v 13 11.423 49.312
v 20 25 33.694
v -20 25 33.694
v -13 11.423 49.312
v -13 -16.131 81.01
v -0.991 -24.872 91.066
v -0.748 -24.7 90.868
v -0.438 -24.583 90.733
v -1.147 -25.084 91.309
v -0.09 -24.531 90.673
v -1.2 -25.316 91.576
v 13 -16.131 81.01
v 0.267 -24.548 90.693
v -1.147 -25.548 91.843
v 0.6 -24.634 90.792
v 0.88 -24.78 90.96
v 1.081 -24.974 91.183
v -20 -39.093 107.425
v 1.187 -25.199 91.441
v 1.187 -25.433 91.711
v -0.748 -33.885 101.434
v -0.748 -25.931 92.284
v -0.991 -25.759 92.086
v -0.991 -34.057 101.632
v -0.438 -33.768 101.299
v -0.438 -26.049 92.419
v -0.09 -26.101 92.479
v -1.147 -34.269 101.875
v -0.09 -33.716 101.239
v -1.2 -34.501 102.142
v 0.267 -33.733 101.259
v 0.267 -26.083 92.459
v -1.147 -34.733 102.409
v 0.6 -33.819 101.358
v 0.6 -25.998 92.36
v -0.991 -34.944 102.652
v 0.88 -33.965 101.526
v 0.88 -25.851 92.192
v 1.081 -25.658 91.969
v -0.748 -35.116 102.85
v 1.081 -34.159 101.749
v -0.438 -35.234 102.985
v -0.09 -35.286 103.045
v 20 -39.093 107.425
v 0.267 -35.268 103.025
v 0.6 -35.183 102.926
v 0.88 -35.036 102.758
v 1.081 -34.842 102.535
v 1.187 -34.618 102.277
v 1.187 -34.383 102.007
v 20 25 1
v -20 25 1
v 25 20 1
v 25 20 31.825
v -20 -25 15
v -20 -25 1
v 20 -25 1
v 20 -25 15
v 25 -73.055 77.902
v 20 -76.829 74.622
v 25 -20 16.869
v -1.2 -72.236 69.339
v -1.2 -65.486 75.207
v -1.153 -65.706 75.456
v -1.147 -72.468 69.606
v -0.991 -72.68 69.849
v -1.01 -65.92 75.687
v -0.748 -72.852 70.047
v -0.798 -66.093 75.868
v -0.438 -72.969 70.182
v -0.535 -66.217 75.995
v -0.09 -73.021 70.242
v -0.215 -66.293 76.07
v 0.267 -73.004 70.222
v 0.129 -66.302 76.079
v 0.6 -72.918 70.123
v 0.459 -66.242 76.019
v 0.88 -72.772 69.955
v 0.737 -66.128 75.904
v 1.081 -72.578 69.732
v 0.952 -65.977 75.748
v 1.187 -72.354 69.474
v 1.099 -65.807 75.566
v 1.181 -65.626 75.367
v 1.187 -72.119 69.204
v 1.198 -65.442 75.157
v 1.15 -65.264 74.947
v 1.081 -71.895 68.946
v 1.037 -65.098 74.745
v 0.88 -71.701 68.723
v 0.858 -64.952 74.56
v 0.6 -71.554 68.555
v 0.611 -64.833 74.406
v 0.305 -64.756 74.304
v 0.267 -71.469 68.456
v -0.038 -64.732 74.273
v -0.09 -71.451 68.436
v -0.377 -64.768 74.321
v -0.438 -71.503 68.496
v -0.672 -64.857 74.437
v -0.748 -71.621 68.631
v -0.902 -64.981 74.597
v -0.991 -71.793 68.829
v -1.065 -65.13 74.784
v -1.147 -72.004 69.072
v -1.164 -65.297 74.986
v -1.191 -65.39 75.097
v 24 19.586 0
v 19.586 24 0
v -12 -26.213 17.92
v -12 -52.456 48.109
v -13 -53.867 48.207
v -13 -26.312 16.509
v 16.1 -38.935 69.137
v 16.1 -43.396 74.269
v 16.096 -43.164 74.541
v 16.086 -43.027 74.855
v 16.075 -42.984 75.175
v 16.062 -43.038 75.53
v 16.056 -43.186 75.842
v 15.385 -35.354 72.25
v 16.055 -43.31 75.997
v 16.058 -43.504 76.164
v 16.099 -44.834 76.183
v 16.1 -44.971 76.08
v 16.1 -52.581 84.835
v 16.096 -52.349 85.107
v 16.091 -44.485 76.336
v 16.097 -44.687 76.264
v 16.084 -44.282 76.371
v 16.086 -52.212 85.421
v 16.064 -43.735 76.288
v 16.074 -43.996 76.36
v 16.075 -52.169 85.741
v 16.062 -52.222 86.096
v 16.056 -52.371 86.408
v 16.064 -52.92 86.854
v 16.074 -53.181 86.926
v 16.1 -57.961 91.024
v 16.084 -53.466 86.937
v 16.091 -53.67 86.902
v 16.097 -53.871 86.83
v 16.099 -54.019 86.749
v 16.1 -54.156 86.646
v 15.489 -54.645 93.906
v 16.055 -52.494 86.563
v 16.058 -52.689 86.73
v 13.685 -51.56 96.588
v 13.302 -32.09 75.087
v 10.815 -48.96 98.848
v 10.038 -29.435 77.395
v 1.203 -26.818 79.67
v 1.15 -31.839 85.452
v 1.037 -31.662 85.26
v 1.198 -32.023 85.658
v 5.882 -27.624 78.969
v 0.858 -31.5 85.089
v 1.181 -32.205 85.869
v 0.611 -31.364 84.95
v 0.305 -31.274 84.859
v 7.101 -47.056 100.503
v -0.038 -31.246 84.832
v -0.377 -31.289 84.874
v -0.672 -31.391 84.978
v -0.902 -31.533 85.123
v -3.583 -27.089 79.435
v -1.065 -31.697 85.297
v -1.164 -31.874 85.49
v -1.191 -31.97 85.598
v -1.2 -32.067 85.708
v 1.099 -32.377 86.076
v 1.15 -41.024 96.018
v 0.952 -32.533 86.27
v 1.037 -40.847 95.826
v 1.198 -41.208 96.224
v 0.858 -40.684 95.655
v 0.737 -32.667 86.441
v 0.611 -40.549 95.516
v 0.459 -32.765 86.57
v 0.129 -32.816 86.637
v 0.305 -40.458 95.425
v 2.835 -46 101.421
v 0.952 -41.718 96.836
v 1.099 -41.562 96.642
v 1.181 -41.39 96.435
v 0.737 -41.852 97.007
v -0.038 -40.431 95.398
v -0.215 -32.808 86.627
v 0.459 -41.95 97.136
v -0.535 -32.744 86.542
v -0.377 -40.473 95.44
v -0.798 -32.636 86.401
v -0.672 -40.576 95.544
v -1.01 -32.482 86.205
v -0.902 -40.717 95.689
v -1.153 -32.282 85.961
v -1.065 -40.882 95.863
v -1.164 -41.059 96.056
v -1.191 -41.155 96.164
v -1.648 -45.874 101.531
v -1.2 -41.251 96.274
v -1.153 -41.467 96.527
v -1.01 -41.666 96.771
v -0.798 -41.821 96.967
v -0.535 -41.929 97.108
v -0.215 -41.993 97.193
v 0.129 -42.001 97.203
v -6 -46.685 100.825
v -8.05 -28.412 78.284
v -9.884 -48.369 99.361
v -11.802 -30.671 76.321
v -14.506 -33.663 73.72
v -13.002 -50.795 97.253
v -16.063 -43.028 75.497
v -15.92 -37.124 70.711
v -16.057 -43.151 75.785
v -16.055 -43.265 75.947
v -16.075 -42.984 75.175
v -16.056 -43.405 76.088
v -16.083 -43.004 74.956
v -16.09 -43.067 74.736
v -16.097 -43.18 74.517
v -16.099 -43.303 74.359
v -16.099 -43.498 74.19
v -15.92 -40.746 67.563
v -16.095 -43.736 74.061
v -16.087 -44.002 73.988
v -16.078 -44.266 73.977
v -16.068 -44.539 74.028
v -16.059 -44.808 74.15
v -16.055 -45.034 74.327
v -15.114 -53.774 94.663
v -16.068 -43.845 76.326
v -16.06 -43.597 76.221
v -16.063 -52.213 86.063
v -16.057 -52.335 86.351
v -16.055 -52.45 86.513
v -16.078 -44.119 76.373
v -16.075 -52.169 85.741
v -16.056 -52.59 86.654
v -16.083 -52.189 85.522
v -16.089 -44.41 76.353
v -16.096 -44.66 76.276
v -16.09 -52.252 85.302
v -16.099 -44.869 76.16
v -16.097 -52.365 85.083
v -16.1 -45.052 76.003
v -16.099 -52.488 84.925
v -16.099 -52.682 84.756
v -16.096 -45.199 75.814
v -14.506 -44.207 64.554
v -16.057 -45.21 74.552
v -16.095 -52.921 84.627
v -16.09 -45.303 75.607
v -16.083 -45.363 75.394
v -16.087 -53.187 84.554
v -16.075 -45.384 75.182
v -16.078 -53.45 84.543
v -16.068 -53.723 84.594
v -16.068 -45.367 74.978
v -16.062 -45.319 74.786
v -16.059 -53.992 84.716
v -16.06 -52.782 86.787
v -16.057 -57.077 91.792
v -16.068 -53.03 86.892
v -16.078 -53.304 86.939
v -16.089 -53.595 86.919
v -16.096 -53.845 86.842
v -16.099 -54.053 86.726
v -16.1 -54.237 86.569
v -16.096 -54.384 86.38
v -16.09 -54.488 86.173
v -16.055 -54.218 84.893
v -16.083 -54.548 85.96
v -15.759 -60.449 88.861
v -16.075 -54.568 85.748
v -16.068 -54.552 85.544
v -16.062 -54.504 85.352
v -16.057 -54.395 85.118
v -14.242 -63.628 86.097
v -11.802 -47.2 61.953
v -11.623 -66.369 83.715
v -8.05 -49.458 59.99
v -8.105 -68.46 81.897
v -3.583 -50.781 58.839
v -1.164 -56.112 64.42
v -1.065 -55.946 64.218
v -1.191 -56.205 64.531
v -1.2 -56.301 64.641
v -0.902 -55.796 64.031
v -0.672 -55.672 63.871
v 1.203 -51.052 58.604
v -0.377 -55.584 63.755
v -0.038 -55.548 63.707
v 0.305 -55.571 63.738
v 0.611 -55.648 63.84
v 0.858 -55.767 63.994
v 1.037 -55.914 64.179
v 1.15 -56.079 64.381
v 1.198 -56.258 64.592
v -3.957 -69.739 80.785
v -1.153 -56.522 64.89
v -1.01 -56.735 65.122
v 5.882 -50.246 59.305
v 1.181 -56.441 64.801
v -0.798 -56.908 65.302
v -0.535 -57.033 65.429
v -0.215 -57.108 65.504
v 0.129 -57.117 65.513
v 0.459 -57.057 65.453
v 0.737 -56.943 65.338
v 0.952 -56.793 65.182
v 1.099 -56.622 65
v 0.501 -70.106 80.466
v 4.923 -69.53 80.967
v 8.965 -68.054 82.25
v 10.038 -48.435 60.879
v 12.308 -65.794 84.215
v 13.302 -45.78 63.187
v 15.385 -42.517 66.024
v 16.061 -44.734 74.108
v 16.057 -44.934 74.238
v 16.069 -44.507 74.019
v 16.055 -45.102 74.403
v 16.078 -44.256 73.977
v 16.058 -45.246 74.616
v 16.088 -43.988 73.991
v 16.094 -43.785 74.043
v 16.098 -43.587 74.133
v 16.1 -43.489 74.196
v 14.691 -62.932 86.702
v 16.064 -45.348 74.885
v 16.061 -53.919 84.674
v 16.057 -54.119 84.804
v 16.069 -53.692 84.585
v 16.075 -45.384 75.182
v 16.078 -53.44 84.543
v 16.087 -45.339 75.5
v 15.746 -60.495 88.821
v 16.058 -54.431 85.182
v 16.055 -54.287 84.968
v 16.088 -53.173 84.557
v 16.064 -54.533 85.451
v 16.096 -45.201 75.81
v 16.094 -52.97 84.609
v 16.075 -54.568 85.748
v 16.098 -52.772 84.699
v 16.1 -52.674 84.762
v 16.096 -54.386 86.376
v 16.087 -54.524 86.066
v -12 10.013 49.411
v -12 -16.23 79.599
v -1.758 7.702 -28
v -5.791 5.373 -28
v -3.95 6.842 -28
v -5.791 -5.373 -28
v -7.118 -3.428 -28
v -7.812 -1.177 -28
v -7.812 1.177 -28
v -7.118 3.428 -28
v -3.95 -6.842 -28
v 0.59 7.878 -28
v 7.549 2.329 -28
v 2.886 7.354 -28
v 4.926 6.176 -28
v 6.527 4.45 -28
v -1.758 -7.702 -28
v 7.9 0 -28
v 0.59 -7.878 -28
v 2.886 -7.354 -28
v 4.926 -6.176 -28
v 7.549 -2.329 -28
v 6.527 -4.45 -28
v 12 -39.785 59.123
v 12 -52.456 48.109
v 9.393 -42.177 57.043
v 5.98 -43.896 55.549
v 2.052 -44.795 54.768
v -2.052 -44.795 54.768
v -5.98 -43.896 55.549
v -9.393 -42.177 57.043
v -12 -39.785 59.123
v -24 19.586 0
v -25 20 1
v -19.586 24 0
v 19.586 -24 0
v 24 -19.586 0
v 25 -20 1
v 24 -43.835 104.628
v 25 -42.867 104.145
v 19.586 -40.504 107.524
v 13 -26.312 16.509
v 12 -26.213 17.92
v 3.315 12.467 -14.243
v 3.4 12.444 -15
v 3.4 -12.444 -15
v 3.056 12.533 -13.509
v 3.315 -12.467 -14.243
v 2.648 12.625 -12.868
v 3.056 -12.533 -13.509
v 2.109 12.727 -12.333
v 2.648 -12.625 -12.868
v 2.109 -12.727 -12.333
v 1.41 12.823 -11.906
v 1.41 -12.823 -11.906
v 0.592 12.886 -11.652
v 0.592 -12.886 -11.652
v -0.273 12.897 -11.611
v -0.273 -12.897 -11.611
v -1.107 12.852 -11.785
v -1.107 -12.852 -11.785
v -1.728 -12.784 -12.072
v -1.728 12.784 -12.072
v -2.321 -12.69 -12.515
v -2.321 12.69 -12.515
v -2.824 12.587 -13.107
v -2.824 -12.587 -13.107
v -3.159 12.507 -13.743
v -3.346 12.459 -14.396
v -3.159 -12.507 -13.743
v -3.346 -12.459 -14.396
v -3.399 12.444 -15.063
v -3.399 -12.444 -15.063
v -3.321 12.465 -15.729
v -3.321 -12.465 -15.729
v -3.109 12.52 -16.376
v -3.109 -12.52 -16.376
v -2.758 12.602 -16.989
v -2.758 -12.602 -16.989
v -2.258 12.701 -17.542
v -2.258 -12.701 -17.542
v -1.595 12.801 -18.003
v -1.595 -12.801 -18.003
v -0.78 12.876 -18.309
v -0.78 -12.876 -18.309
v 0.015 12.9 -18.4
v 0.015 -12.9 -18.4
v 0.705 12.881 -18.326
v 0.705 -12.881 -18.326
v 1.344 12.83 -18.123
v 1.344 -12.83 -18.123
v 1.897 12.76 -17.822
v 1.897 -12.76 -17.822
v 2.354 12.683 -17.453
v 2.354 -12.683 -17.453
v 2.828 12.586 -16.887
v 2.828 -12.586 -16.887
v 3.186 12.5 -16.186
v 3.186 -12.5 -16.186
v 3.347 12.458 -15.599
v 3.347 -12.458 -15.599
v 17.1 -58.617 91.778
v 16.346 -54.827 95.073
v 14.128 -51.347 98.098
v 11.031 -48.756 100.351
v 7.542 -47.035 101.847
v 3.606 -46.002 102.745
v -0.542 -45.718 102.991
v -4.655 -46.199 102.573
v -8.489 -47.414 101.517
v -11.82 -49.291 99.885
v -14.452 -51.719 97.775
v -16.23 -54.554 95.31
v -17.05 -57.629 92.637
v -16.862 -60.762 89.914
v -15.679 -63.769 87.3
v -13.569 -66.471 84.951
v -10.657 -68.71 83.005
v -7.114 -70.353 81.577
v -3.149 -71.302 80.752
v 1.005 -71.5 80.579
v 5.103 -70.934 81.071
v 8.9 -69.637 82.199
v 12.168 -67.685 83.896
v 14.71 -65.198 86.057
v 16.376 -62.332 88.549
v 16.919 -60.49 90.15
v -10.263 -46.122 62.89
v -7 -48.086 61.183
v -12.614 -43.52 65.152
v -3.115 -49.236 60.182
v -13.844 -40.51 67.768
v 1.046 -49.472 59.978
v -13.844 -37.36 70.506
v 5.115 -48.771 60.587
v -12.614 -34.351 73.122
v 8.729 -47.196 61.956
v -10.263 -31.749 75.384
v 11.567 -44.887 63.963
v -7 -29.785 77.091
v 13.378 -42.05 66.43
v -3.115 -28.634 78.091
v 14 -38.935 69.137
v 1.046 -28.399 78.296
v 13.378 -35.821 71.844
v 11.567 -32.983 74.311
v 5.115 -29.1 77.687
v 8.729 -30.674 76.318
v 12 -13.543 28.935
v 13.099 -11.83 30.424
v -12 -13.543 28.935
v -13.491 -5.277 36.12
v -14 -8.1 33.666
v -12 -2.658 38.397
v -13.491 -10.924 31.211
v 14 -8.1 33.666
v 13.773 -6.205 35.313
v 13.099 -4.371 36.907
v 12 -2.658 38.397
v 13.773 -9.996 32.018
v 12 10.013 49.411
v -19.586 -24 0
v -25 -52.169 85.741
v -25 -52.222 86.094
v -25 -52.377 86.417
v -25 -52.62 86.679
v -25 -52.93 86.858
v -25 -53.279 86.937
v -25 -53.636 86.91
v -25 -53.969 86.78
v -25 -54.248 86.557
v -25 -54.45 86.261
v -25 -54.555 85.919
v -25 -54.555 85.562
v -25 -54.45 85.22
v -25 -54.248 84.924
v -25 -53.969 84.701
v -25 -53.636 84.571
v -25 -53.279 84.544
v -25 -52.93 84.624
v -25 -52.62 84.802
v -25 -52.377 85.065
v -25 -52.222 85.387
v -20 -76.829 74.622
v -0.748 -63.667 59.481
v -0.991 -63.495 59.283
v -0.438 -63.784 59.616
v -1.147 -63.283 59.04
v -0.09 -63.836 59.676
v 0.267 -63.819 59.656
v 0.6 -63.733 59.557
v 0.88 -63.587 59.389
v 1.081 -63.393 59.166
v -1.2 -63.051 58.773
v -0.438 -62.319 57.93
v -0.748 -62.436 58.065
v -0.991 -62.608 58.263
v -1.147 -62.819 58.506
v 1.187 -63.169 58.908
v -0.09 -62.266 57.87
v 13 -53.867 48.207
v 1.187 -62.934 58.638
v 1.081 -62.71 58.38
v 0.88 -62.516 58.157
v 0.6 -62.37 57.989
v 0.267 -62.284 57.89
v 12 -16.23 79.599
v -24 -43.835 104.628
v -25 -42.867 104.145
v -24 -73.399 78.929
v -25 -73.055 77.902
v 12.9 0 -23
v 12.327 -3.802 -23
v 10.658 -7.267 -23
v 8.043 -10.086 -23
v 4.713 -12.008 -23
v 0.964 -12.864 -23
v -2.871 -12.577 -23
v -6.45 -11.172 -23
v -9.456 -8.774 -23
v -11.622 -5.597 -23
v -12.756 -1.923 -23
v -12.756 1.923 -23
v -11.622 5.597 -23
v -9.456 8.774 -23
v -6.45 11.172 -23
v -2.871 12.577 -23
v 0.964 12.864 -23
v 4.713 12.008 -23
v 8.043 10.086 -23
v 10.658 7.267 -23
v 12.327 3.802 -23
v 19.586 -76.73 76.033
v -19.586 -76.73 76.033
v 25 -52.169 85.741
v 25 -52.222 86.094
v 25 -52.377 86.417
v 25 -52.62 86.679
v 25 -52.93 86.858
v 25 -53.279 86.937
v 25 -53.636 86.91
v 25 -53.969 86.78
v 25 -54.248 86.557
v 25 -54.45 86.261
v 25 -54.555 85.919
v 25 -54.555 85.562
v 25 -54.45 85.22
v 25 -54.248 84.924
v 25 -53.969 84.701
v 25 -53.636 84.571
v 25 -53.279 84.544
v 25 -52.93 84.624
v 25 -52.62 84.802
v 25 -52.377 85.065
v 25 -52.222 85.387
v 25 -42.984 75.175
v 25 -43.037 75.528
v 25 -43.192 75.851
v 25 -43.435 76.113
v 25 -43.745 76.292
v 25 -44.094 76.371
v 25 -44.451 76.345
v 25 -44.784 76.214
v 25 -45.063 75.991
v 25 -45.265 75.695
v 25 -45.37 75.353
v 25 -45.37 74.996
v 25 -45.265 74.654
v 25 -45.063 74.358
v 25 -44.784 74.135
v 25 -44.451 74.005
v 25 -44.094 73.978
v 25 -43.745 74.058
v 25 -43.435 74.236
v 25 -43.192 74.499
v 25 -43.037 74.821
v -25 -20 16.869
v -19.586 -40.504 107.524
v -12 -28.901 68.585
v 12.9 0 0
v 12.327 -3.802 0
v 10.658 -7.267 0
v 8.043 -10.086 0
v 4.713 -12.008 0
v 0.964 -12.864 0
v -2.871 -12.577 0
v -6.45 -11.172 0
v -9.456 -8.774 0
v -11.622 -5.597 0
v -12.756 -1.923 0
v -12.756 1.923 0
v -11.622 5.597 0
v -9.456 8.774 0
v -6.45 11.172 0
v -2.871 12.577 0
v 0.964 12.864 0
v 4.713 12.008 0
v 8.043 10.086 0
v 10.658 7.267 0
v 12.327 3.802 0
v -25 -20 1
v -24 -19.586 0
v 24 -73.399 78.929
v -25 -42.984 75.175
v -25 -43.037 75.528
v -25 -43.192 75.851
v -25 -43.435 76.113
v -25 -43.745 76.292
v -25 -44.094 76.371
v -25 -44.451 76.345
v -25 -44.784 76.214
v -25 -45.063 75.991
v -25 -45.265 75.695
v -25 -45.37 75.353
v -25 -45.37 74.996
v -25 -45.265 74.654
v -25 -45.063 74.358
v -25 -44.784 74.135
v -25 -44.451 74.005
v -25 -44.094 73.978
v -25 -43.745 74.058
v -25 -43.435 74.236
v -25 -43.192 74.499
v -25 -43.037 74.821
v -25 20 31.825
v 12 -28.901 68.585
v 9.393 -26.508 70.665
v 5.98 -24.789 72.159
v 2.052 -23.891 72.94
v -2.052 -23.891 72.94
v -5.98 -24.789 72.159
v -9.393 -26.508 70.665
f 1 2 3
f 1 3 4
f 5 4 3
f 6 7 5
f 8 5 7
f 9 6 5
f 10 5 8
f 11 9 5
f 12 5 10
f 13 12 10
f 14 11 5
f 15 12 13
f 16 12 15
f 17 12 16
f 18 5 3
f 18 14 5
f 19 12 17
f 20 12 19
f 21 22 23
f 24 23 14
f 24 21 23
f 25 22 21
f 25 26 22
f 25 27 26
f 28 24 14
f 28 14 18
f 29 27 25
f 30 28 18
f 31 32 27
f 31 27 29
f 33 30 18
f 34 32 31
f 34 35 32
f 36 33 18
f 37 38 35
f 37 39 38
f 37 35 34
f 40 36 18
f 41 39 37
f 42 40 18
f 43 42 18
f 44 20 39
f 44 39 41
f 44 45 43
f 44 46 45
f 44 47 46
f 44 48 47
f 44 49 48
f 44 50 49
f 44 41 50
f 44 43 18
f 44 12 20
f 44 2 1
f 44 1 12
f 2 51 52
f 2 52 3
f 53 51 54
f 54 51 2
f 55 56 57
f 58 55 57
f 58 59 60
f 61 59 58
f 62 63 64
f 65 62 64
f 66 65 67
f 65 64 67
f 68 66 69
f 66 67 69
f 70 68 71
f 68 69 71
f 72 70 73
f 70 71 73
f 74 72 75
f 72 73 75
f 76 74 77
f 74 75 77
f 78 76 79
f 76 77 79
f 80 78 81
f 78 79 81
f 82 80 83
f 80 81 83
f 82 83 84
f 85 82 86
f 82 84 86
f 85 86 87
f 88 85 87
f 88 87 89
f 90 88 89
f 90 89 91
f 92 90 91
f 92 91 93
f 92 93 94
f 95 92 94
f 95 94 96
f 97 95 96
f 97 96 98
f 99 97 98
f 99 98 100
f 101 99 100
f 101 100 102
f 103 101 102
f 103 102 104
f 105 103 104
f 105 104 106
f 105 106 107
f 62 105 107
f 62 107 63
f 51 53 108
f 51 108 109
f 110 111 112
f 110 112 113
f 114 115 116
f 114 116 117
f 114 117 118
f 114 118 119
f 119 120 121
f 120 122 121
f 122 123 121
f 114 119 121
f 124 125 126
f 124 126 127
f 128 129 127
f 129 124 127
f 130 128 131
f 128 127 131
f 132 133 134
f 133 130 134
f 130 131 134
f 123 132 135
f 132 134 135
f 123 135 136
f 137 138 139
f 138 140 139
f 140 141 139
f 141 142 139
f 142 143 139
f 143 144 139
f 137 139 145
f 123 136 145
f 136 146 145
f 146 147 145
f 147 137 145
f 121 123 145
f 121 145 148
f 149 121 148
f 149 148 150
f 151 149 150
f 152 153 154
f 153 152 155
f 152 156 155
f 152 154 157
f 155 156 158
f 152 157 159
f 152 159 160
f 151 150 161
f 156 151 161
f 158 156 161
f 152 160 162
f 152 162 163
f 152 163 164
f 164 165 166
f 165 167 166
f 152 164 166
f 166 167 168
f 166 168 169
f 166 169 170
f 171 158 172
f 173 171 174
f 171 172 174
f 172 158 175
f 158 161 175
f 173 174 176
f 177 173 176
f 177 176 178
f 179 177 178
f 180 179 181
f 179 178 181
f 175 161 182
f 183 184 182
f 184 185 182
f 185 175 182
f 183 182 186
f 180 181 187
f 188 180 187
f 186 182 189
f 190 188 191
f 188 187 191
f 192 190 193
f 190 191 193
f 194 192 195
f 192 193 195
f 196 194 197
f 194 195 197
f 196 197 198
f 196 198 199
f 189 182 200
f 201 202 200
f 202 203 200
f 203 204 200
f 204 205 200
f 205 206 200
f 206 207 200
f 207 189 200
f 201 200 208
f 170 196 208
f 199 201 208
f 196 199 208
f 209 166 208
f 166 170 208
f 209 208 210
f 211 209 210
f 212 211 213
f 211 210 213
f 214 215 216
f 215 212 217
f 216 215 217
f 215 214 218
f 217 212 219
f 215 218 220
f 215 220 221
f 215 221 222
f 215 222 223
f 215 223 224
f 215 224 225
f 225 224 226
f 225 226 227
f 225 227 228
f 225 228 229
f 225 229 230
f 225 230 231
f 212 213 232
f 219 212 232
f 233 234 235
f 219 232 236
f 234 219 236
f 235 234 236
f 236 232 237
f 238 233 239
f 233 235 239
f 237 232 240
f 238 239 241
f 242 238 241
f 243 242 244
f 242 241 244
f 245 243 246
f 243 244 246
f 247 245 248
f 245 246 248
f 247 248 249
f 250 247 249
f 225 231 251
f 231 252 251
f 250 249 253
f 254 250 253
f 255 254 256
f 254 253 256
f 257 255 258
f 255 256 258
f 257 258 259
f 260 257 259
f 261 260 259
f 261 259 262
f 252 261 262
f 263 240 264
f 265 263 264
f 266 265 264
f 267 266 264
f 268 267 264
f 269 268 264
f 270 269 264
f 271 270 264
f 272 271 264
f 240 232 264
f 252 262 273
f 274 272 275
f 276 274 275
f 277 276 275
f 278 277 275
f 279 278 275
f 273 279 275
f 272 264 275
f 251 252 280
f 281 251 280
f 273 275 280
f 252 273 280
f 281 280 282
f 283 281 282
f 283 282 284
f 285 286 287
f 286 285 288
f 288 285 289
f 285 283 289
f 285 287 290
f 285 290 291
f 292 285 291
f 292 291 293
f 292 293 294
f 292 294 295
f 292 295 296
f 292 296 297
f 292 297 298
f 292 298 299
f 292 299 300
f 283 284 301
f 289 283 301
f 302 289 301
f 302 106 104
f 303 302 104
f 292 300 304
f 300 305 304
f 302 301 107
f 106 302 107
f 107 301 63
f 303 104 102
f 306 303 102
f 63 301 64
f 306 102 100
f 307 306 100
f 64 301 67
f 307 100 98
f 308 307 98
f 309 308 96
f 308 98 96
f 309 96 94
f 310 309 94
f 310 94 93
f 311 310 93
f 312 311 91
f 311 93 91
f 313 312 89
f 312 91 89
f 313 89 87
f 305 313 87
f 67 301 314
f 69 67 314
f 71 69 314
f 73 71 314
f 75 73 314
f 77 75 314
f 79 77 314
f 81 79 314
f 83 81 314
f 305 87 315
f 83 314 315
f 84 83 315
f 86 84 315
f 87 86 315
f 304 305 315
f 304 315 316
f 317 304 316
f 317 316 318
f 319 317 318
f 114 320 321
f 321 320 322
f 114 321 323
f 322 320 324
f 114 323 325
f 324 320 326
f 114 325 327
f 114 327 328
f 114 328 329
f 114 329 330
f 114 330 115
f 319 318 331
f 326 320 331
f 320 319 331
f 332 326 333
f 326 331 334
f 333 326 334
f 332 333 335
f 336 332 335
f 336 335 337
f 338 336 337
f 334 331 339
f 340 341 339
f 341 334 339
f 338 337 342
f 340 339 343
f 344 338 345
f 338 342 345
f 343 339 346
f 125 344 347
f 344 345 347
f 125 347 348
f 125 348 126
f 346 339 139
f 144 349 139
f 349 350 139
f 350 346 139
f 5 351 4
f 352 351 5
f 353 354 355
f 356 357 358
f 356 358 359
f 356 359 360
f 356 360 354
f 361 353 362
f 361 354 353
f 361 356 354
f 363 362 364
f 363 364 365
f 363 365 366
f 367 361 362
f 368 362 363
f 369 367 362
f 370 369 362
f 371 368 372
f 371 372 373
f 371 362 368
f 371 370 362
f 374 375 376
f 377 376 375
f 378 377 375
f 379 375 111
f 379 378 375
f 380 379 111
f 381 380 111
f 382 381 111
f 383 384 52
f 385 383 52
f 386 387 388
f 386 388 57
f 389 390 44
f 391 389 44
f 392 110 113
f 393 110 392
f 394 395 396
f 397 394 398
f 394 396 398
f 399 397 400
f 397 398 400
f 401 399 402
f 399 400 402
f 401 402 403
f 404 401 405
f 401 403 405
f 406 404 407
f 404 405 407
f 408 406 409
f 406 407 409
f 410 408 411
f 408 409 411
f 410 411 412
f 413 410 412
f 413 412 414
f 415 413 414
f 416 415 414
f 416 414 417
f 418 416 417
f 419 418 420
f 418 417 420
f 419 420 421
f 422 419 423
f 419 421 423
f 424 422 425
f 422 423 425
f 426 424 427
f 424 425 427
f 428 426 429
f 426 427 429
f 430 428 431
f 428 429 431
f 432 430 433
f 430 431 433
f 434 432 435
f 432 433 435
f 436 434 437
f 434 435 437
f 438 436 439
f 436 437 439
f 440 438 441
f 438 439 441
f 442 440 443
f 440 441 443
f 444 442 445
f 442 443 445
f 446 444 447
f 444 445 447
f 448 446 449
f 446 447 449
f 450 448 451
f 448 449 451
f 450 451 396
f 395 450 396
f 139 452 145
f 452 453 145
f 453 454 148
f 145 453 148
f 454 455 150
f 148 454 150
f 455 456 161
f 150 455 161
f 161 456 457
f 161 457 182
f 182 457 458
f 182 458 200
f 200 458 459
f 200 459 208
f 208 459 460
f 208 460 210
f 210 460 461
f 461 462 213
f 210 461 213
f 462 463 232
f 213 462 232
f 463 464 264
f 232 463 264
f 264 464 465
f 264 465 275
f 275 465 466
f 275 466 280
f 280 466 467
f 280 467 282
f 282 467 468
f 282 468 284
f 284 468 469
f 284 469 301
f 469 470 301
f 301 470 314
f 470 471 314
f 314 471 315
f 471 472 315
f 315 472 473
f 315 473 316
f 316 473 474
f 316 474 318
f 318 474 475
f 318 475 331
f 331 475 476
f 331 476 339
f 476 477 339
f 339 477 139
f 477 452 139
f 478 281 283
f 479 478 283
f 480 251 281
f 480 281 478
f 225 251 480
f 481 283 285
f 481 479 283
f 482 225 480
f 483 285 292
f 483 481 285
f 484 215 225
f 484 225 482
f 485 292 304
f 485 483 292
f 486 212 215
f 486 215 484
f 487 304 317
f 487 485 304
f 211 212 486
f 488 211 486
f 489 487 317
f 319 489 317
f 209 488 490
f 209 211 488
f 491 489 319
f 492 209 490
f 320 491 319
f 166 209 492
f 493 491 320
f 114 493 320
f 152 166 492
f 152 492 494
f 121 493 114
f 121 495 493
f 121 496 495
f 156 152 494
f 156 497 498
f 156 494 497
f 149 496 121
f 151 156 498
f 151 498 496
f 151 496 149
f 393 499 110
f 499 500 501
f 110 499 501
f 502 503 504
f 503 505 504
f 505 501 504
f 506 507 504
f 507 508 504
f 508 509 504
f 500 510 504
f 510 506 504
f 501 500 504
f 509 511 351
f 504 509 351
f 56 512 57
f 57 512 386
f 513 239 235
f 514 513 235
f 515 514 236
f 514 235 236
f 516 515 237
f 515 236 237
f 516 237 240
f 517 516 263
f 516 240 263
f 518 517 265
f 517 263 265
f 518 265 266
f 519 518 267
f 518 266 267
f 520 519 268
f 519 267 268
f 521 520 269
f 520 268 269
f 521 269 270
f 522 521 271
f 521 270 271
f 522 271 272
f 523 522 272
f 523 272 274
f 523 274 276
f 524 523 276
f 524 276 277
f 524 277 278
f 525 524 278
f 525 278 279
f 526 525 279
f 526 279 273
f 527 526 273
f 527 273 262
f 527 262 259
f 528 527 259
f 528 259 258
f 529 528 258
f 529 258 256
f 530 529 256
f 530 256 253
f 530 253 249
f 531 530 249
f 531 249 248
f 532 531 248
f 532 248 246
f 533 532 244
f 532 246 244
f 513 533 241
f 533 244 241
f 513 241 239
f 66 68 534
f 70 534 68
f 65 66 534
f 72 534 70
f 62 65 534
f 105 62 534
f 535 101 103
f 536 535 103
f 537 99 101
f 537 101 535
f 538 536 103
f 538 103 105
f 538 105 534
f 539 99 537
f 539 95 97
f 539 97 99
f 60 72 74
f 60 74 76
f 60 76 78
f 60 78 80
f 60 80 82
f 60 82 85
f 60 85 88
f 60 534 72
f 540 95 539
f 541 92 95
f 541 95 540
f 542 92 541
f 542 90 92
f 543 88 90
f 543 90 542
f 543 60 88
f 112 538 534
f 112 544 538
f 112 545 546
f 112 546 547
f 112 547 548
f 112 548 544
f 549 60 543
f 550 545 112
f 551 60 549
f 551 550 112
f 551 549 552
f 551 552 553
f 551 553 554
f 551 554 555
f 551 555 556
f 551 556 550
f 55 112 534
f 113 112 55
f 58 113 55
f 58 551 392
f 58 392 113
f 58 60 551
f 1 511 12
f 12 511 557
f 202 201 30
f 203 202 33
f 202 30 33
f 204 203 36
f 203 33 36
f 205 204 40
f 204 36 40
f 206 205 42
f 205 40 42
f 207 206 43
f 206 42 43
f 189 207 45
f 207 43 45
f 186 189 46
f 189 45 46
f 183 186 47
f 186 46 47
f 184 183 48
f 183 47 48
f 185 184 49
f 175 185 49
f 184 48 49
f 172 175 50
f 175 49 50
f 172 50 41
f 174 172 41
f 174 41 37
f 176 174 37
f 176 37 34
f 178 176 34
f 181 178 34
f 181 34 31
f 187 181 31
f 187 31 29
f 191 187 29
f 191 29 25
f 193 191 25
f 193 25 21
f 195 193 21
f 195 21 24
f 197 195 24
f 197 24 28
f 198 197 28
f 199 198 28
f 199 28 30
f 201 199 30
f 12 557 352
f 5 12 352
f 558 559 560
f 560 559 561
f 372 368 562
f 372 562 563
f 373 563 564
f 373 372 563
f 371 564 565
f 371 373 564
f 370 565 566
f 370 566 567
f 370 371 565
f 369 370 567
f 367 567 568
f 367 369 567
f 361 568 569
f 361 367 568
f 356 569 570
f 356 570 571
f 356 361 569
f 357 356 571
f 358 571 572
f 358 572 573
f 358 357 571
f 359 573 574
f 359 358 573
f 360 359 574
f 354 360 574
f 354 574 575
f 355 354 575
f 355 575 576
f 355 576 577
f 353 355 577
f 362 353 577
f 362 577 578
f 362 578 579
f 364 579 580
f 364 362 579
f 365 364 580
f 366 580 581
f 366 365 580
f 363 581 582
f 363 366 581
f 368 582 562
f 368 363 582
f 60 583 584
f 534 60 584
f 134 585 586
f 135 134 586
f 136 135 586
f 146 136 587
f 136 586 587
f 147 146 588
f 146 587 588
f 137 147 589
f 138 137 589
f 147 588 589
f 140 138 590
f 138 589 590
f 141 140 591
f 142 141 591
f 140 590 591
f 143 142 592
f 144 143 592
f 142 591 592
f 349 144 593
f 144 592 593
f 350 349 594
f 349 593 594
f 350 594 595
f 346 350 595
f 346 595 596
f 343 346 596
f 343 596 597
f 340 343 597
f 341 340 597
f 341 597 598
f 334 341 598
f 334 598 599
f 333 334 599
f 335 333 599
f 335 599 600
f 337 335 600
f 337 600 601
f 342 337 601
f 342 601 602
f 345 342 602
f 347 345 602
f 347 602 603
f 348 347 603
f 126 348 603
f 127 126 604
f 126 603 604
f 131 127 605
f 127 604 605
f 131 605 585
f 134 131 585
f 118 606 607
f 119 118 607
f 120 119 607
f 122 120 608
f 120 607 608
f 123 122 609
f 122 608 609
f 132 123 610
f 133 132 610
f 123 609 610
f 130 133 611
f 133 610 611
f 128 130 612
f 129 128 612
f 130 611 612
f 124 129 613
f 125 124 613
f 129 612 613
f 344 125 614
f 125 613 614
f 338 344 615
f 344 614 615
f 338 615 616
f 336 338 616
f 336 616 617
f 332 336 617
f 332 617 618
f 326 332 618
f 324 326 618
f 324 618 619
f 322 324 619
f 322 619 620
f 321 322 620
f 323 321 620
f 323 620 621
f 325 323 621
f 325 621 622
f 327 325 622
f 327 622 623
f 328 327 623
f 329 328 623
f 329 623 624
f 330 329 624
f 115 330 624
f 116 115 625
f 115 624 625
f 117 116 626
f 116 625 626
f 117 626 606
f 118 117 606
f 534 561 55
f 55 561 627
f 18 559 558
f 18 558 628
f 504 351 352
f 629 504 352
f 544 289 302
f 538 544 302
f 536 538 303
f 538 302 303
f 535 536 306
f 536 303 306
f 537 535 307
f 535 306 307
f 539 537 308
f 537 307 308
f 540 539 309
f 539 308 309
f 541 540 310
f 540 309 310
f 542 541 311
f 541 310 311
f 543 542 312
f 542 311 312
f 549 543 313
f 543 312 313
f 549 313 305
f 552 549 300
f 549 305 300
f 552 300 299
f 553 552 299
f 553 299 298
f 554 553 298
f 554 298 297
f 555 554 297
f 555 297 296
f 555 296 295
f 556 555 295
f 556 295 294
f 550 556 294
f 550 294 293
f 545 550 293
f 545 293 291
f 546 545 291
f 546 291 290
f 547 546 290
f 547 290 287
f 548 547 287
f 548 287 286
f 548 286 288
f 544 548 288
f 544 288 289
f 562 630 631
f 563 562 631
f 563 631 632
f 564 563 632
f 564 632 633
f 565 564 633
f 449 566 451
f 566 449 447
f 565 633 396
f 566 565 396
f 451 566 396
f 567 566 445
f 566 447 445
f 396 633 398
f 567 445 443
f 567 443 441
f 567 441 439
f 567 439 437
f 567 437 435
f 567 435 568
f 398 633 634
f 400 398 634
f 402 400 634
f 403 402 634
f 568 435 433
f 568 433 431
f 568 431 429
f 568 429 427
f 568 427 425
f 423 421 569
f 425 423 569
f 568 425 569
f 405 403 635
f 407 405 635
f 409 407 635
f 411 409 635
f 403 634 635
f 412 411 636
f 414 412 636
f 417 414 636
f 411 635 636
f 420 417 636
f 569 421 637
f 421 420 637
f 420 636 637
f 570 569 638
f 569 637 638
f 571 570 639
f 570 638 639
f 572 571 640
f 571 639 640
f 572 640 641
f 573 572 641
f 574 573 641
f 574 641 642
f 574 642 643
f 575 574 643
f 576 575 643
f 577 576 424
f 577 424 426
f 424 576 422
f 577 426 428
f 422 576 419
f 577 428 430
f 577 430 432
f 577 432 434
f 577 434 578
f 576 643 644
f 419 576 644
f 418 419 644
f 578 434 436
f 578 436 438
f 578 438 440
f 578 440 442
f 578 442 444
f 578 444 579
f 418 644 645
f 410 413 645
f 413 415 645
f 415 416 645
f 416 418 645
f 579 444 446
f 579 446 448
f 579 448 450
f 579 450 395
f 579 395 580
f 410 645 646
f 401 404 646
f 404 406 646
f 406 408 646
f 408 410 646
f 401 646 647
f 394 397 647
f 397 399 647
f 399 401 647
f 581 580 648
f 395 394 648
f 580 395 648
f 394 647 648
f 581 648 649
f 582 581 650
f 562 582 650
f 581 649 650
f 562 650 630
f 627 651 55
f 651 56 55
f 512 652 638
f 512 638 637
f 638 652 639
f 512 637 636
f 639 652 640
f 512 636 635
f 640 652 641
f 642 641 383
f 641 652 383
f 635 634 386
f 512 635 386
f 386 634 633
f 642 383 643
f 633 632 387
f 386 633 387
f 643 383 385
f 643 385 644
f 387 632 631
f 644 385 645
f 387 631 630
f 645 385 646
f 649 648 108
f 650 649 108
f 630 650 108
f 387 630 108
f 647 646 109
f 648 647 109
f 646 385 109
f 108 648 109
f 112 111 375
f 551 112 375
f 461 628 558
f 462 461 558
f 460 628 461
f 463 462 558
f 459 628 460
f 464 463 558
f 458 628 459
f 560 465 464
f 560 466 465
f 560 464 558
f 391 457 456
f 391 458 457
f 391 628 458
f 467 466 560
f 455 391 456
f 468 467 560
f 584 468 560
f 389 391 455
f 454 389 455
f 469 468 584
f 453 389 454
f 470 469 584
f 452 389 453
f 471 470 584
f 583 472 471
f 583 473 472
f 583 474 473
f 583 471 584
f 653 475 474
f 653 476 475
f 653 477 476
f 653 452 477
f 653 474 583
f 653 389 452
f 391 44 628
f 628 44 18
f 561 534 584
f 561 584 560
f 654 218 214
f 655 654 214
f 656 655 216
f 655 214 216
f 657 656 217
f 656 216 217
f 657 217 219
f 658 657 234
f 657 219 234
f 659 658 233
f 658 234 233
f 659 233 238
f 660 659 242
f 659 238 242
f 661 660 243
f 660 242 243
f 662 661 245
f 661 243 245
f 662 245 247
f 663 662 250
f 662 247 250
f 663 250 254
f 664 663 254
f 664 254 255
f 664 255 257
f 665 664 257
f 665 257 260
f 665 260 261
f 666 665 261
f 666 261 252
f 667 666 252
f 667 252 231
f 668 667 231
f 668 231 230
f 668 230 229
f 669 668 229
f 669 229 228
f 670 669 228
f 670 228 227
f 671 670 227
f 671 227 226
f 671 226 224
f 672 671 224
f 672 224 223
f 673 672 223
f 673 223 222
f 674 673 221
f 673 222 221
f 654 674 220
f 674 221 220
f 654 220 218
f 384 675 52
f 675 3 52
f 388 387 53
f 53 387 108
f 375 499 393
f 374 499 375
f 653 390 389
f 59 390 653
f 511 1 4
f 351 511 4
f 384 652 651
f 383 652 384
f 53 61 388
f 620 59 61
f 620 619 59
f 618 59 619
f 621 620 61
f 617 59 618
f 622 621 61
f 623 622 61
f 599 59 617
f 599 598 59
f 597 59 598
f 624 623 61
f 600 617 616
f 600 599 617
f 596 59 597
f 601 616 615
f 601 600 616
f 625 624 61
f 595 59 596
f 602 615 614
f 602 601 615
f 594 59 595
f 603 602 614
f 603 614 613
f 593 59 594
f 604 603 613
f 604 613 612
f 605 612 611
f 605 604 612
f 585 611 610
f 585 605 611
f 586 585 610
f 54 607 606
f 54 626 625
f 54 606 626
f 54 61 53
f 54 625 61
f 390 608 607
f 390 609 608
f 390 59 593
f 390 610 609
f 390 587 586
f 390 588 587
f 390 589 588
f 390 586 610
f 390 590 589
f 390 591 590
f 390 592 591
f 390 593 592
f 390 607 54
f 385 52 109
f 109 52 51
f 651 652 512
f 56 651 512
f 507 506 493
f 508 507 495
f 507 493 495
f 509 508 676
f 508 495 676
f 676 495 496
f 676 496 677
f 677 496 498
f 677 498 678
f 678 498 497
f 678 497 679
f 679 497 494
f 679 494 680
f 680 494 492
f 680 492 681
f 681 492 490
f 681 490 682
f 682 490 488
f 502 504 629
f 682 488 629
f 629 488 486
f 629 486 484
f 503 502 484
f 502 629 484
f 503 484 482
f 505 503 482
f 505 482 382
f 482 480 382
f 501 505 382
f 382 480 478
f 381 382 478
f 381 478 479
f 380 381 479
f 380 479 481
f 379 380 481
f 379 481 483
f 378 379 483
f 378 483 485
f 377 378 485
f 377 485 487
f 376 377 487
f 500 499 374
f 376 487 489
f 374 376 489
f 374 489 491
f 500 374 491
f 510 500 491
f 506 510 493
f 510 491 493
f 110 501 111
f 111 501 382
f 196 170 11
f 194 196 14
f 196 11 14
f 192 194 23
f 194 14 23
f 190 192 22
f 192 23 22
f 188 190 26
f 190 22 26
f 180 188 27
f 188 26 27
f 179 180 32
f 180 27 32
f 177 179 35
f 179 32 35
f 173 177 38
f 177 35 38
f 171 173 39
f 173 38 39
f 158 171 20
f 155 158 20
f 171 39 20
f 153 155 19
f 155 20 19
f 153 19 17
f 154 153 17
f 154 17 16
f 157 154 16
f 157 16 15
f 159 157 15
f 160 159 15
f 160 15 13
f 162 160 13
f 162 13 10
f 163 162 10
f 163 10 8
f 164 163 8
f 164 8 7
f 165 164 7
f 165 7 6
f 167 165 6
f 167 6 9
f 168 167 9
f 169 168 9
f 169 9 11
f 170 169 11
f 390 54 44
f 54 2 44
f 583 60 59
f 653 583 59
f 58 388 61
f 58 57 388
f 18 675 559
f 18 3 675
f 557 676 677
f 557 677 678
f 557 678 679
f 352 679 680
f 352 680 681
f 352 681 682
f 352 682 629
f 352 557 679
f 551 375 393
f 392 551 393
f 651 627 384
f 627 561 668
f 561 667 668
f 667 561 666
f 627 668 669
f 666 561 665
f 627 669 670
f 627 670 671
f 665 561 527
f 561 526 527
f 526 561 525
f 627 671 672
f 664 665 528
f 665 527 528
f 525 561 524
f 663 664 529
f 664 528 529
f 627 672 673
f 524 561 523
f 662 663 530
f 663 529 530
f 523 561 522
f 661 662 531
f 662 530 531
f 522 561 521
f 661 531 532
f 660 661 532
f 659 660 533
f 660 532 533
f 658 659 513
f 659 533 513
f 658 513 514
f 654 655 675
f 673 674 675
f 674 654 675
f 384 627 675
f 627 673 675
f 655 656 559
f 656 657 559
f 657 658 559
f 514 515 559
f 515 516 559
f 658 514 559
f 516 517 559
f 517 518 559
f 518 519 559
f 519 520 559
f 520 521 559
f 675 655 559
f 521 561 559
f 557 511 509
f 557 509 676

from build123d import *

# Parameters (mm, degrees)
F0_W      = 50
F0_H      = 50
F1_DEPTH  = 15
F2_R      = 12.9
F3_DEPTH  = 28
F4_R      = 3.4
F5_DEPTH  = 21
F7_DEPTH  = 50
F8_R      = 14
F9_DEPTH  = 77
F10_R     = 16.1
F11_DEPTH = 30
F12_W     = 24
F12_H     = 40
F13_DEPTH = 117.8222610619
F14_R     = 1.2
F15_DEPTH = 117.8222610619
F16_R     = 1.2
F17_DEPTH = 50.001
F18_SIZE  = 5
F19_SIZE  = 1


with BuildPart() as f1:
    # F0 (on Top) → F1 (new body)
    with BuildSketch(Plane.XY):
        Rectangle(F0_W, F0_H)
    extrude(amount=F1_DEPTH)

    # F2 (on face) → F3 (join)
    with BuildSketch(Plane(origin=(0, 0, 0), x_dir=(1, 0, 0), z_dir=(0, 0, -1))):
        Circle(F2_R)
    extrude(amount=F3_DEPTH)

    # F4 (on Front) → F5 (cut, symmetric)
    with BuildSketch(Plane.XZ):
        with Locations((0, -15)):
            Circle(F4_R)
    extrude(amount=F5_DEPTH, both=True, mode=Mode.SUBTRACT)

    # F6 (on face) → F7 (join)
    with BuildSketch(Plane.YZ.offset(25)):
        Polygon((-77.4847223192, 75.3767664178), (-25, 15), (25, 15), (25, 33.6942339742), (-39.7492433081, 108.1797178673), align=None)
    extrude(amount=-F7_DEPTH)

    # F8 (on face) → F9 (cut)
    with BuildSketch(Plane(origin=(0, -70.6720690728, 81.2989155343), x_dir=(1, 0, 0), z_dir=(0, -0.656059029, 0.7547095802))):
        with Locations((0, 15.9731459293)):
            Circle(F8_R)
    extrude(amount=-F9_DEPTH, mode=Mode.SUBTRACT)

    # F10 (on face) → F11 (cut)
    with BuildSketch(Plane(origin=(0, -70.6720690728, 81.2989155343), x_dir=(1, 0, 0), z_dir=(0, -0.656059029, 0.7547095802))):
        with Locations((0, 15.9731459293)):
            Circle(F10_R)
    extrude(amount=-F11_DEPTH, mode=Mode.SUBTRACT)

    # F12 (on face) → F13 (cut, through all)
    with BuildSketch(Plane(origin=(0, 30.9228257647, 26.8808023331), x_dir=(-1, 0, 0), z_dir=(0, 0.7547095802, 0.656059029))):
        with Locations((0, 50.7221194281)):
            Rectangle(F12_W, F12_H)
    extrude(amount=-F13_DEPTH, mode=Mode.SUBTRACT)

    # F14 (on face) → F15 (cut, through all)
    with BuildSketch(Plane(origin=(0, 30.9228257647, 26.8808023331), x_dir=(-1, 0, 0), z_dir=(0, 0.7547095802, 0.656059029))):
        with Locations((0, 99.7221194281)):
            Circle(F14_R)
        with Locations((0, 85.7221194281)):
            Circle(F14_R)
    extrude(amount=-F15_DEPTH, mode=Mode.SUBTRACT)

    # F16 (on face) → F17 (cut, through all)
    with BuildSketch(Plane.YZ.offset(25)):
        with Locations((-53.3685105817, 85.7405655008)):
            Circle(F16_R)
        with Locations((-44.1836841759, 75.1746313777)):
            Circle(F16_R)
    extrude(amount=-F17_DEPTH, mode=Mode.SUBTRACT)

    # F18
    f18_edges = [f1.edges().sort_by_distance(p)[0] for p in [
        (-12.9, 0, -28),
        (25, -51.242361, 45.188383),
        (25, -25, 7.5),
        (25, 25, 16.847117),
        (25, -7.374622, 70.936976),
        (-25, 25, 16.847117),
        (-25, -7.374622, 70.936976),
        (-25, -25, 7.5),
        (-25, -51.242361, 45.188383),
    ]]
    chamfer(f18_edges, length=F18_SIZE)

    # F19
    f19_edges = [f1.edges().sort_by_distance(p)[0] for p in [
        (-16.1, -58.616983, 91.778242),
        (12, -40.089358, 32.35832),
        (0, -53.210538, 47.452512),
        (-12, -40.089358, 32.35832),
        (0, -26.968177, 17.264129),
        (0, 10.767302, 50.06708),
        (-12, -2.353879, 65.161272),
        (12, -2.353879, 65.161272),
        (0, -15.475059, 80.255463),
        (-25, 0, 0),
        (-22.5, -22.5, 0),
        (0, -25, 0),
        (22.5, -22.5, 0),
        (25, 0, 0),
        (22.5, 22.5, 0),
        (0, 25, 0),
        (-22.5, 22.5, 0),
        (0, -77.484722, 75.376766),
        (-22.5, -75.597948, 77.016914),
        (-25, -58.616983, 91.778242),
        (25, -58.616983, 91.778242),
        (22.5, -75.597948, 77.016914),
        (22.5, -41.636017, 106.53957),
        (0, -39.749243, 108.179718),
        (-22.5, -41.636017, 106.53957),
    ]]
    chamfer(f19_edges, length=F19_SIZE)


solid = f1.part
